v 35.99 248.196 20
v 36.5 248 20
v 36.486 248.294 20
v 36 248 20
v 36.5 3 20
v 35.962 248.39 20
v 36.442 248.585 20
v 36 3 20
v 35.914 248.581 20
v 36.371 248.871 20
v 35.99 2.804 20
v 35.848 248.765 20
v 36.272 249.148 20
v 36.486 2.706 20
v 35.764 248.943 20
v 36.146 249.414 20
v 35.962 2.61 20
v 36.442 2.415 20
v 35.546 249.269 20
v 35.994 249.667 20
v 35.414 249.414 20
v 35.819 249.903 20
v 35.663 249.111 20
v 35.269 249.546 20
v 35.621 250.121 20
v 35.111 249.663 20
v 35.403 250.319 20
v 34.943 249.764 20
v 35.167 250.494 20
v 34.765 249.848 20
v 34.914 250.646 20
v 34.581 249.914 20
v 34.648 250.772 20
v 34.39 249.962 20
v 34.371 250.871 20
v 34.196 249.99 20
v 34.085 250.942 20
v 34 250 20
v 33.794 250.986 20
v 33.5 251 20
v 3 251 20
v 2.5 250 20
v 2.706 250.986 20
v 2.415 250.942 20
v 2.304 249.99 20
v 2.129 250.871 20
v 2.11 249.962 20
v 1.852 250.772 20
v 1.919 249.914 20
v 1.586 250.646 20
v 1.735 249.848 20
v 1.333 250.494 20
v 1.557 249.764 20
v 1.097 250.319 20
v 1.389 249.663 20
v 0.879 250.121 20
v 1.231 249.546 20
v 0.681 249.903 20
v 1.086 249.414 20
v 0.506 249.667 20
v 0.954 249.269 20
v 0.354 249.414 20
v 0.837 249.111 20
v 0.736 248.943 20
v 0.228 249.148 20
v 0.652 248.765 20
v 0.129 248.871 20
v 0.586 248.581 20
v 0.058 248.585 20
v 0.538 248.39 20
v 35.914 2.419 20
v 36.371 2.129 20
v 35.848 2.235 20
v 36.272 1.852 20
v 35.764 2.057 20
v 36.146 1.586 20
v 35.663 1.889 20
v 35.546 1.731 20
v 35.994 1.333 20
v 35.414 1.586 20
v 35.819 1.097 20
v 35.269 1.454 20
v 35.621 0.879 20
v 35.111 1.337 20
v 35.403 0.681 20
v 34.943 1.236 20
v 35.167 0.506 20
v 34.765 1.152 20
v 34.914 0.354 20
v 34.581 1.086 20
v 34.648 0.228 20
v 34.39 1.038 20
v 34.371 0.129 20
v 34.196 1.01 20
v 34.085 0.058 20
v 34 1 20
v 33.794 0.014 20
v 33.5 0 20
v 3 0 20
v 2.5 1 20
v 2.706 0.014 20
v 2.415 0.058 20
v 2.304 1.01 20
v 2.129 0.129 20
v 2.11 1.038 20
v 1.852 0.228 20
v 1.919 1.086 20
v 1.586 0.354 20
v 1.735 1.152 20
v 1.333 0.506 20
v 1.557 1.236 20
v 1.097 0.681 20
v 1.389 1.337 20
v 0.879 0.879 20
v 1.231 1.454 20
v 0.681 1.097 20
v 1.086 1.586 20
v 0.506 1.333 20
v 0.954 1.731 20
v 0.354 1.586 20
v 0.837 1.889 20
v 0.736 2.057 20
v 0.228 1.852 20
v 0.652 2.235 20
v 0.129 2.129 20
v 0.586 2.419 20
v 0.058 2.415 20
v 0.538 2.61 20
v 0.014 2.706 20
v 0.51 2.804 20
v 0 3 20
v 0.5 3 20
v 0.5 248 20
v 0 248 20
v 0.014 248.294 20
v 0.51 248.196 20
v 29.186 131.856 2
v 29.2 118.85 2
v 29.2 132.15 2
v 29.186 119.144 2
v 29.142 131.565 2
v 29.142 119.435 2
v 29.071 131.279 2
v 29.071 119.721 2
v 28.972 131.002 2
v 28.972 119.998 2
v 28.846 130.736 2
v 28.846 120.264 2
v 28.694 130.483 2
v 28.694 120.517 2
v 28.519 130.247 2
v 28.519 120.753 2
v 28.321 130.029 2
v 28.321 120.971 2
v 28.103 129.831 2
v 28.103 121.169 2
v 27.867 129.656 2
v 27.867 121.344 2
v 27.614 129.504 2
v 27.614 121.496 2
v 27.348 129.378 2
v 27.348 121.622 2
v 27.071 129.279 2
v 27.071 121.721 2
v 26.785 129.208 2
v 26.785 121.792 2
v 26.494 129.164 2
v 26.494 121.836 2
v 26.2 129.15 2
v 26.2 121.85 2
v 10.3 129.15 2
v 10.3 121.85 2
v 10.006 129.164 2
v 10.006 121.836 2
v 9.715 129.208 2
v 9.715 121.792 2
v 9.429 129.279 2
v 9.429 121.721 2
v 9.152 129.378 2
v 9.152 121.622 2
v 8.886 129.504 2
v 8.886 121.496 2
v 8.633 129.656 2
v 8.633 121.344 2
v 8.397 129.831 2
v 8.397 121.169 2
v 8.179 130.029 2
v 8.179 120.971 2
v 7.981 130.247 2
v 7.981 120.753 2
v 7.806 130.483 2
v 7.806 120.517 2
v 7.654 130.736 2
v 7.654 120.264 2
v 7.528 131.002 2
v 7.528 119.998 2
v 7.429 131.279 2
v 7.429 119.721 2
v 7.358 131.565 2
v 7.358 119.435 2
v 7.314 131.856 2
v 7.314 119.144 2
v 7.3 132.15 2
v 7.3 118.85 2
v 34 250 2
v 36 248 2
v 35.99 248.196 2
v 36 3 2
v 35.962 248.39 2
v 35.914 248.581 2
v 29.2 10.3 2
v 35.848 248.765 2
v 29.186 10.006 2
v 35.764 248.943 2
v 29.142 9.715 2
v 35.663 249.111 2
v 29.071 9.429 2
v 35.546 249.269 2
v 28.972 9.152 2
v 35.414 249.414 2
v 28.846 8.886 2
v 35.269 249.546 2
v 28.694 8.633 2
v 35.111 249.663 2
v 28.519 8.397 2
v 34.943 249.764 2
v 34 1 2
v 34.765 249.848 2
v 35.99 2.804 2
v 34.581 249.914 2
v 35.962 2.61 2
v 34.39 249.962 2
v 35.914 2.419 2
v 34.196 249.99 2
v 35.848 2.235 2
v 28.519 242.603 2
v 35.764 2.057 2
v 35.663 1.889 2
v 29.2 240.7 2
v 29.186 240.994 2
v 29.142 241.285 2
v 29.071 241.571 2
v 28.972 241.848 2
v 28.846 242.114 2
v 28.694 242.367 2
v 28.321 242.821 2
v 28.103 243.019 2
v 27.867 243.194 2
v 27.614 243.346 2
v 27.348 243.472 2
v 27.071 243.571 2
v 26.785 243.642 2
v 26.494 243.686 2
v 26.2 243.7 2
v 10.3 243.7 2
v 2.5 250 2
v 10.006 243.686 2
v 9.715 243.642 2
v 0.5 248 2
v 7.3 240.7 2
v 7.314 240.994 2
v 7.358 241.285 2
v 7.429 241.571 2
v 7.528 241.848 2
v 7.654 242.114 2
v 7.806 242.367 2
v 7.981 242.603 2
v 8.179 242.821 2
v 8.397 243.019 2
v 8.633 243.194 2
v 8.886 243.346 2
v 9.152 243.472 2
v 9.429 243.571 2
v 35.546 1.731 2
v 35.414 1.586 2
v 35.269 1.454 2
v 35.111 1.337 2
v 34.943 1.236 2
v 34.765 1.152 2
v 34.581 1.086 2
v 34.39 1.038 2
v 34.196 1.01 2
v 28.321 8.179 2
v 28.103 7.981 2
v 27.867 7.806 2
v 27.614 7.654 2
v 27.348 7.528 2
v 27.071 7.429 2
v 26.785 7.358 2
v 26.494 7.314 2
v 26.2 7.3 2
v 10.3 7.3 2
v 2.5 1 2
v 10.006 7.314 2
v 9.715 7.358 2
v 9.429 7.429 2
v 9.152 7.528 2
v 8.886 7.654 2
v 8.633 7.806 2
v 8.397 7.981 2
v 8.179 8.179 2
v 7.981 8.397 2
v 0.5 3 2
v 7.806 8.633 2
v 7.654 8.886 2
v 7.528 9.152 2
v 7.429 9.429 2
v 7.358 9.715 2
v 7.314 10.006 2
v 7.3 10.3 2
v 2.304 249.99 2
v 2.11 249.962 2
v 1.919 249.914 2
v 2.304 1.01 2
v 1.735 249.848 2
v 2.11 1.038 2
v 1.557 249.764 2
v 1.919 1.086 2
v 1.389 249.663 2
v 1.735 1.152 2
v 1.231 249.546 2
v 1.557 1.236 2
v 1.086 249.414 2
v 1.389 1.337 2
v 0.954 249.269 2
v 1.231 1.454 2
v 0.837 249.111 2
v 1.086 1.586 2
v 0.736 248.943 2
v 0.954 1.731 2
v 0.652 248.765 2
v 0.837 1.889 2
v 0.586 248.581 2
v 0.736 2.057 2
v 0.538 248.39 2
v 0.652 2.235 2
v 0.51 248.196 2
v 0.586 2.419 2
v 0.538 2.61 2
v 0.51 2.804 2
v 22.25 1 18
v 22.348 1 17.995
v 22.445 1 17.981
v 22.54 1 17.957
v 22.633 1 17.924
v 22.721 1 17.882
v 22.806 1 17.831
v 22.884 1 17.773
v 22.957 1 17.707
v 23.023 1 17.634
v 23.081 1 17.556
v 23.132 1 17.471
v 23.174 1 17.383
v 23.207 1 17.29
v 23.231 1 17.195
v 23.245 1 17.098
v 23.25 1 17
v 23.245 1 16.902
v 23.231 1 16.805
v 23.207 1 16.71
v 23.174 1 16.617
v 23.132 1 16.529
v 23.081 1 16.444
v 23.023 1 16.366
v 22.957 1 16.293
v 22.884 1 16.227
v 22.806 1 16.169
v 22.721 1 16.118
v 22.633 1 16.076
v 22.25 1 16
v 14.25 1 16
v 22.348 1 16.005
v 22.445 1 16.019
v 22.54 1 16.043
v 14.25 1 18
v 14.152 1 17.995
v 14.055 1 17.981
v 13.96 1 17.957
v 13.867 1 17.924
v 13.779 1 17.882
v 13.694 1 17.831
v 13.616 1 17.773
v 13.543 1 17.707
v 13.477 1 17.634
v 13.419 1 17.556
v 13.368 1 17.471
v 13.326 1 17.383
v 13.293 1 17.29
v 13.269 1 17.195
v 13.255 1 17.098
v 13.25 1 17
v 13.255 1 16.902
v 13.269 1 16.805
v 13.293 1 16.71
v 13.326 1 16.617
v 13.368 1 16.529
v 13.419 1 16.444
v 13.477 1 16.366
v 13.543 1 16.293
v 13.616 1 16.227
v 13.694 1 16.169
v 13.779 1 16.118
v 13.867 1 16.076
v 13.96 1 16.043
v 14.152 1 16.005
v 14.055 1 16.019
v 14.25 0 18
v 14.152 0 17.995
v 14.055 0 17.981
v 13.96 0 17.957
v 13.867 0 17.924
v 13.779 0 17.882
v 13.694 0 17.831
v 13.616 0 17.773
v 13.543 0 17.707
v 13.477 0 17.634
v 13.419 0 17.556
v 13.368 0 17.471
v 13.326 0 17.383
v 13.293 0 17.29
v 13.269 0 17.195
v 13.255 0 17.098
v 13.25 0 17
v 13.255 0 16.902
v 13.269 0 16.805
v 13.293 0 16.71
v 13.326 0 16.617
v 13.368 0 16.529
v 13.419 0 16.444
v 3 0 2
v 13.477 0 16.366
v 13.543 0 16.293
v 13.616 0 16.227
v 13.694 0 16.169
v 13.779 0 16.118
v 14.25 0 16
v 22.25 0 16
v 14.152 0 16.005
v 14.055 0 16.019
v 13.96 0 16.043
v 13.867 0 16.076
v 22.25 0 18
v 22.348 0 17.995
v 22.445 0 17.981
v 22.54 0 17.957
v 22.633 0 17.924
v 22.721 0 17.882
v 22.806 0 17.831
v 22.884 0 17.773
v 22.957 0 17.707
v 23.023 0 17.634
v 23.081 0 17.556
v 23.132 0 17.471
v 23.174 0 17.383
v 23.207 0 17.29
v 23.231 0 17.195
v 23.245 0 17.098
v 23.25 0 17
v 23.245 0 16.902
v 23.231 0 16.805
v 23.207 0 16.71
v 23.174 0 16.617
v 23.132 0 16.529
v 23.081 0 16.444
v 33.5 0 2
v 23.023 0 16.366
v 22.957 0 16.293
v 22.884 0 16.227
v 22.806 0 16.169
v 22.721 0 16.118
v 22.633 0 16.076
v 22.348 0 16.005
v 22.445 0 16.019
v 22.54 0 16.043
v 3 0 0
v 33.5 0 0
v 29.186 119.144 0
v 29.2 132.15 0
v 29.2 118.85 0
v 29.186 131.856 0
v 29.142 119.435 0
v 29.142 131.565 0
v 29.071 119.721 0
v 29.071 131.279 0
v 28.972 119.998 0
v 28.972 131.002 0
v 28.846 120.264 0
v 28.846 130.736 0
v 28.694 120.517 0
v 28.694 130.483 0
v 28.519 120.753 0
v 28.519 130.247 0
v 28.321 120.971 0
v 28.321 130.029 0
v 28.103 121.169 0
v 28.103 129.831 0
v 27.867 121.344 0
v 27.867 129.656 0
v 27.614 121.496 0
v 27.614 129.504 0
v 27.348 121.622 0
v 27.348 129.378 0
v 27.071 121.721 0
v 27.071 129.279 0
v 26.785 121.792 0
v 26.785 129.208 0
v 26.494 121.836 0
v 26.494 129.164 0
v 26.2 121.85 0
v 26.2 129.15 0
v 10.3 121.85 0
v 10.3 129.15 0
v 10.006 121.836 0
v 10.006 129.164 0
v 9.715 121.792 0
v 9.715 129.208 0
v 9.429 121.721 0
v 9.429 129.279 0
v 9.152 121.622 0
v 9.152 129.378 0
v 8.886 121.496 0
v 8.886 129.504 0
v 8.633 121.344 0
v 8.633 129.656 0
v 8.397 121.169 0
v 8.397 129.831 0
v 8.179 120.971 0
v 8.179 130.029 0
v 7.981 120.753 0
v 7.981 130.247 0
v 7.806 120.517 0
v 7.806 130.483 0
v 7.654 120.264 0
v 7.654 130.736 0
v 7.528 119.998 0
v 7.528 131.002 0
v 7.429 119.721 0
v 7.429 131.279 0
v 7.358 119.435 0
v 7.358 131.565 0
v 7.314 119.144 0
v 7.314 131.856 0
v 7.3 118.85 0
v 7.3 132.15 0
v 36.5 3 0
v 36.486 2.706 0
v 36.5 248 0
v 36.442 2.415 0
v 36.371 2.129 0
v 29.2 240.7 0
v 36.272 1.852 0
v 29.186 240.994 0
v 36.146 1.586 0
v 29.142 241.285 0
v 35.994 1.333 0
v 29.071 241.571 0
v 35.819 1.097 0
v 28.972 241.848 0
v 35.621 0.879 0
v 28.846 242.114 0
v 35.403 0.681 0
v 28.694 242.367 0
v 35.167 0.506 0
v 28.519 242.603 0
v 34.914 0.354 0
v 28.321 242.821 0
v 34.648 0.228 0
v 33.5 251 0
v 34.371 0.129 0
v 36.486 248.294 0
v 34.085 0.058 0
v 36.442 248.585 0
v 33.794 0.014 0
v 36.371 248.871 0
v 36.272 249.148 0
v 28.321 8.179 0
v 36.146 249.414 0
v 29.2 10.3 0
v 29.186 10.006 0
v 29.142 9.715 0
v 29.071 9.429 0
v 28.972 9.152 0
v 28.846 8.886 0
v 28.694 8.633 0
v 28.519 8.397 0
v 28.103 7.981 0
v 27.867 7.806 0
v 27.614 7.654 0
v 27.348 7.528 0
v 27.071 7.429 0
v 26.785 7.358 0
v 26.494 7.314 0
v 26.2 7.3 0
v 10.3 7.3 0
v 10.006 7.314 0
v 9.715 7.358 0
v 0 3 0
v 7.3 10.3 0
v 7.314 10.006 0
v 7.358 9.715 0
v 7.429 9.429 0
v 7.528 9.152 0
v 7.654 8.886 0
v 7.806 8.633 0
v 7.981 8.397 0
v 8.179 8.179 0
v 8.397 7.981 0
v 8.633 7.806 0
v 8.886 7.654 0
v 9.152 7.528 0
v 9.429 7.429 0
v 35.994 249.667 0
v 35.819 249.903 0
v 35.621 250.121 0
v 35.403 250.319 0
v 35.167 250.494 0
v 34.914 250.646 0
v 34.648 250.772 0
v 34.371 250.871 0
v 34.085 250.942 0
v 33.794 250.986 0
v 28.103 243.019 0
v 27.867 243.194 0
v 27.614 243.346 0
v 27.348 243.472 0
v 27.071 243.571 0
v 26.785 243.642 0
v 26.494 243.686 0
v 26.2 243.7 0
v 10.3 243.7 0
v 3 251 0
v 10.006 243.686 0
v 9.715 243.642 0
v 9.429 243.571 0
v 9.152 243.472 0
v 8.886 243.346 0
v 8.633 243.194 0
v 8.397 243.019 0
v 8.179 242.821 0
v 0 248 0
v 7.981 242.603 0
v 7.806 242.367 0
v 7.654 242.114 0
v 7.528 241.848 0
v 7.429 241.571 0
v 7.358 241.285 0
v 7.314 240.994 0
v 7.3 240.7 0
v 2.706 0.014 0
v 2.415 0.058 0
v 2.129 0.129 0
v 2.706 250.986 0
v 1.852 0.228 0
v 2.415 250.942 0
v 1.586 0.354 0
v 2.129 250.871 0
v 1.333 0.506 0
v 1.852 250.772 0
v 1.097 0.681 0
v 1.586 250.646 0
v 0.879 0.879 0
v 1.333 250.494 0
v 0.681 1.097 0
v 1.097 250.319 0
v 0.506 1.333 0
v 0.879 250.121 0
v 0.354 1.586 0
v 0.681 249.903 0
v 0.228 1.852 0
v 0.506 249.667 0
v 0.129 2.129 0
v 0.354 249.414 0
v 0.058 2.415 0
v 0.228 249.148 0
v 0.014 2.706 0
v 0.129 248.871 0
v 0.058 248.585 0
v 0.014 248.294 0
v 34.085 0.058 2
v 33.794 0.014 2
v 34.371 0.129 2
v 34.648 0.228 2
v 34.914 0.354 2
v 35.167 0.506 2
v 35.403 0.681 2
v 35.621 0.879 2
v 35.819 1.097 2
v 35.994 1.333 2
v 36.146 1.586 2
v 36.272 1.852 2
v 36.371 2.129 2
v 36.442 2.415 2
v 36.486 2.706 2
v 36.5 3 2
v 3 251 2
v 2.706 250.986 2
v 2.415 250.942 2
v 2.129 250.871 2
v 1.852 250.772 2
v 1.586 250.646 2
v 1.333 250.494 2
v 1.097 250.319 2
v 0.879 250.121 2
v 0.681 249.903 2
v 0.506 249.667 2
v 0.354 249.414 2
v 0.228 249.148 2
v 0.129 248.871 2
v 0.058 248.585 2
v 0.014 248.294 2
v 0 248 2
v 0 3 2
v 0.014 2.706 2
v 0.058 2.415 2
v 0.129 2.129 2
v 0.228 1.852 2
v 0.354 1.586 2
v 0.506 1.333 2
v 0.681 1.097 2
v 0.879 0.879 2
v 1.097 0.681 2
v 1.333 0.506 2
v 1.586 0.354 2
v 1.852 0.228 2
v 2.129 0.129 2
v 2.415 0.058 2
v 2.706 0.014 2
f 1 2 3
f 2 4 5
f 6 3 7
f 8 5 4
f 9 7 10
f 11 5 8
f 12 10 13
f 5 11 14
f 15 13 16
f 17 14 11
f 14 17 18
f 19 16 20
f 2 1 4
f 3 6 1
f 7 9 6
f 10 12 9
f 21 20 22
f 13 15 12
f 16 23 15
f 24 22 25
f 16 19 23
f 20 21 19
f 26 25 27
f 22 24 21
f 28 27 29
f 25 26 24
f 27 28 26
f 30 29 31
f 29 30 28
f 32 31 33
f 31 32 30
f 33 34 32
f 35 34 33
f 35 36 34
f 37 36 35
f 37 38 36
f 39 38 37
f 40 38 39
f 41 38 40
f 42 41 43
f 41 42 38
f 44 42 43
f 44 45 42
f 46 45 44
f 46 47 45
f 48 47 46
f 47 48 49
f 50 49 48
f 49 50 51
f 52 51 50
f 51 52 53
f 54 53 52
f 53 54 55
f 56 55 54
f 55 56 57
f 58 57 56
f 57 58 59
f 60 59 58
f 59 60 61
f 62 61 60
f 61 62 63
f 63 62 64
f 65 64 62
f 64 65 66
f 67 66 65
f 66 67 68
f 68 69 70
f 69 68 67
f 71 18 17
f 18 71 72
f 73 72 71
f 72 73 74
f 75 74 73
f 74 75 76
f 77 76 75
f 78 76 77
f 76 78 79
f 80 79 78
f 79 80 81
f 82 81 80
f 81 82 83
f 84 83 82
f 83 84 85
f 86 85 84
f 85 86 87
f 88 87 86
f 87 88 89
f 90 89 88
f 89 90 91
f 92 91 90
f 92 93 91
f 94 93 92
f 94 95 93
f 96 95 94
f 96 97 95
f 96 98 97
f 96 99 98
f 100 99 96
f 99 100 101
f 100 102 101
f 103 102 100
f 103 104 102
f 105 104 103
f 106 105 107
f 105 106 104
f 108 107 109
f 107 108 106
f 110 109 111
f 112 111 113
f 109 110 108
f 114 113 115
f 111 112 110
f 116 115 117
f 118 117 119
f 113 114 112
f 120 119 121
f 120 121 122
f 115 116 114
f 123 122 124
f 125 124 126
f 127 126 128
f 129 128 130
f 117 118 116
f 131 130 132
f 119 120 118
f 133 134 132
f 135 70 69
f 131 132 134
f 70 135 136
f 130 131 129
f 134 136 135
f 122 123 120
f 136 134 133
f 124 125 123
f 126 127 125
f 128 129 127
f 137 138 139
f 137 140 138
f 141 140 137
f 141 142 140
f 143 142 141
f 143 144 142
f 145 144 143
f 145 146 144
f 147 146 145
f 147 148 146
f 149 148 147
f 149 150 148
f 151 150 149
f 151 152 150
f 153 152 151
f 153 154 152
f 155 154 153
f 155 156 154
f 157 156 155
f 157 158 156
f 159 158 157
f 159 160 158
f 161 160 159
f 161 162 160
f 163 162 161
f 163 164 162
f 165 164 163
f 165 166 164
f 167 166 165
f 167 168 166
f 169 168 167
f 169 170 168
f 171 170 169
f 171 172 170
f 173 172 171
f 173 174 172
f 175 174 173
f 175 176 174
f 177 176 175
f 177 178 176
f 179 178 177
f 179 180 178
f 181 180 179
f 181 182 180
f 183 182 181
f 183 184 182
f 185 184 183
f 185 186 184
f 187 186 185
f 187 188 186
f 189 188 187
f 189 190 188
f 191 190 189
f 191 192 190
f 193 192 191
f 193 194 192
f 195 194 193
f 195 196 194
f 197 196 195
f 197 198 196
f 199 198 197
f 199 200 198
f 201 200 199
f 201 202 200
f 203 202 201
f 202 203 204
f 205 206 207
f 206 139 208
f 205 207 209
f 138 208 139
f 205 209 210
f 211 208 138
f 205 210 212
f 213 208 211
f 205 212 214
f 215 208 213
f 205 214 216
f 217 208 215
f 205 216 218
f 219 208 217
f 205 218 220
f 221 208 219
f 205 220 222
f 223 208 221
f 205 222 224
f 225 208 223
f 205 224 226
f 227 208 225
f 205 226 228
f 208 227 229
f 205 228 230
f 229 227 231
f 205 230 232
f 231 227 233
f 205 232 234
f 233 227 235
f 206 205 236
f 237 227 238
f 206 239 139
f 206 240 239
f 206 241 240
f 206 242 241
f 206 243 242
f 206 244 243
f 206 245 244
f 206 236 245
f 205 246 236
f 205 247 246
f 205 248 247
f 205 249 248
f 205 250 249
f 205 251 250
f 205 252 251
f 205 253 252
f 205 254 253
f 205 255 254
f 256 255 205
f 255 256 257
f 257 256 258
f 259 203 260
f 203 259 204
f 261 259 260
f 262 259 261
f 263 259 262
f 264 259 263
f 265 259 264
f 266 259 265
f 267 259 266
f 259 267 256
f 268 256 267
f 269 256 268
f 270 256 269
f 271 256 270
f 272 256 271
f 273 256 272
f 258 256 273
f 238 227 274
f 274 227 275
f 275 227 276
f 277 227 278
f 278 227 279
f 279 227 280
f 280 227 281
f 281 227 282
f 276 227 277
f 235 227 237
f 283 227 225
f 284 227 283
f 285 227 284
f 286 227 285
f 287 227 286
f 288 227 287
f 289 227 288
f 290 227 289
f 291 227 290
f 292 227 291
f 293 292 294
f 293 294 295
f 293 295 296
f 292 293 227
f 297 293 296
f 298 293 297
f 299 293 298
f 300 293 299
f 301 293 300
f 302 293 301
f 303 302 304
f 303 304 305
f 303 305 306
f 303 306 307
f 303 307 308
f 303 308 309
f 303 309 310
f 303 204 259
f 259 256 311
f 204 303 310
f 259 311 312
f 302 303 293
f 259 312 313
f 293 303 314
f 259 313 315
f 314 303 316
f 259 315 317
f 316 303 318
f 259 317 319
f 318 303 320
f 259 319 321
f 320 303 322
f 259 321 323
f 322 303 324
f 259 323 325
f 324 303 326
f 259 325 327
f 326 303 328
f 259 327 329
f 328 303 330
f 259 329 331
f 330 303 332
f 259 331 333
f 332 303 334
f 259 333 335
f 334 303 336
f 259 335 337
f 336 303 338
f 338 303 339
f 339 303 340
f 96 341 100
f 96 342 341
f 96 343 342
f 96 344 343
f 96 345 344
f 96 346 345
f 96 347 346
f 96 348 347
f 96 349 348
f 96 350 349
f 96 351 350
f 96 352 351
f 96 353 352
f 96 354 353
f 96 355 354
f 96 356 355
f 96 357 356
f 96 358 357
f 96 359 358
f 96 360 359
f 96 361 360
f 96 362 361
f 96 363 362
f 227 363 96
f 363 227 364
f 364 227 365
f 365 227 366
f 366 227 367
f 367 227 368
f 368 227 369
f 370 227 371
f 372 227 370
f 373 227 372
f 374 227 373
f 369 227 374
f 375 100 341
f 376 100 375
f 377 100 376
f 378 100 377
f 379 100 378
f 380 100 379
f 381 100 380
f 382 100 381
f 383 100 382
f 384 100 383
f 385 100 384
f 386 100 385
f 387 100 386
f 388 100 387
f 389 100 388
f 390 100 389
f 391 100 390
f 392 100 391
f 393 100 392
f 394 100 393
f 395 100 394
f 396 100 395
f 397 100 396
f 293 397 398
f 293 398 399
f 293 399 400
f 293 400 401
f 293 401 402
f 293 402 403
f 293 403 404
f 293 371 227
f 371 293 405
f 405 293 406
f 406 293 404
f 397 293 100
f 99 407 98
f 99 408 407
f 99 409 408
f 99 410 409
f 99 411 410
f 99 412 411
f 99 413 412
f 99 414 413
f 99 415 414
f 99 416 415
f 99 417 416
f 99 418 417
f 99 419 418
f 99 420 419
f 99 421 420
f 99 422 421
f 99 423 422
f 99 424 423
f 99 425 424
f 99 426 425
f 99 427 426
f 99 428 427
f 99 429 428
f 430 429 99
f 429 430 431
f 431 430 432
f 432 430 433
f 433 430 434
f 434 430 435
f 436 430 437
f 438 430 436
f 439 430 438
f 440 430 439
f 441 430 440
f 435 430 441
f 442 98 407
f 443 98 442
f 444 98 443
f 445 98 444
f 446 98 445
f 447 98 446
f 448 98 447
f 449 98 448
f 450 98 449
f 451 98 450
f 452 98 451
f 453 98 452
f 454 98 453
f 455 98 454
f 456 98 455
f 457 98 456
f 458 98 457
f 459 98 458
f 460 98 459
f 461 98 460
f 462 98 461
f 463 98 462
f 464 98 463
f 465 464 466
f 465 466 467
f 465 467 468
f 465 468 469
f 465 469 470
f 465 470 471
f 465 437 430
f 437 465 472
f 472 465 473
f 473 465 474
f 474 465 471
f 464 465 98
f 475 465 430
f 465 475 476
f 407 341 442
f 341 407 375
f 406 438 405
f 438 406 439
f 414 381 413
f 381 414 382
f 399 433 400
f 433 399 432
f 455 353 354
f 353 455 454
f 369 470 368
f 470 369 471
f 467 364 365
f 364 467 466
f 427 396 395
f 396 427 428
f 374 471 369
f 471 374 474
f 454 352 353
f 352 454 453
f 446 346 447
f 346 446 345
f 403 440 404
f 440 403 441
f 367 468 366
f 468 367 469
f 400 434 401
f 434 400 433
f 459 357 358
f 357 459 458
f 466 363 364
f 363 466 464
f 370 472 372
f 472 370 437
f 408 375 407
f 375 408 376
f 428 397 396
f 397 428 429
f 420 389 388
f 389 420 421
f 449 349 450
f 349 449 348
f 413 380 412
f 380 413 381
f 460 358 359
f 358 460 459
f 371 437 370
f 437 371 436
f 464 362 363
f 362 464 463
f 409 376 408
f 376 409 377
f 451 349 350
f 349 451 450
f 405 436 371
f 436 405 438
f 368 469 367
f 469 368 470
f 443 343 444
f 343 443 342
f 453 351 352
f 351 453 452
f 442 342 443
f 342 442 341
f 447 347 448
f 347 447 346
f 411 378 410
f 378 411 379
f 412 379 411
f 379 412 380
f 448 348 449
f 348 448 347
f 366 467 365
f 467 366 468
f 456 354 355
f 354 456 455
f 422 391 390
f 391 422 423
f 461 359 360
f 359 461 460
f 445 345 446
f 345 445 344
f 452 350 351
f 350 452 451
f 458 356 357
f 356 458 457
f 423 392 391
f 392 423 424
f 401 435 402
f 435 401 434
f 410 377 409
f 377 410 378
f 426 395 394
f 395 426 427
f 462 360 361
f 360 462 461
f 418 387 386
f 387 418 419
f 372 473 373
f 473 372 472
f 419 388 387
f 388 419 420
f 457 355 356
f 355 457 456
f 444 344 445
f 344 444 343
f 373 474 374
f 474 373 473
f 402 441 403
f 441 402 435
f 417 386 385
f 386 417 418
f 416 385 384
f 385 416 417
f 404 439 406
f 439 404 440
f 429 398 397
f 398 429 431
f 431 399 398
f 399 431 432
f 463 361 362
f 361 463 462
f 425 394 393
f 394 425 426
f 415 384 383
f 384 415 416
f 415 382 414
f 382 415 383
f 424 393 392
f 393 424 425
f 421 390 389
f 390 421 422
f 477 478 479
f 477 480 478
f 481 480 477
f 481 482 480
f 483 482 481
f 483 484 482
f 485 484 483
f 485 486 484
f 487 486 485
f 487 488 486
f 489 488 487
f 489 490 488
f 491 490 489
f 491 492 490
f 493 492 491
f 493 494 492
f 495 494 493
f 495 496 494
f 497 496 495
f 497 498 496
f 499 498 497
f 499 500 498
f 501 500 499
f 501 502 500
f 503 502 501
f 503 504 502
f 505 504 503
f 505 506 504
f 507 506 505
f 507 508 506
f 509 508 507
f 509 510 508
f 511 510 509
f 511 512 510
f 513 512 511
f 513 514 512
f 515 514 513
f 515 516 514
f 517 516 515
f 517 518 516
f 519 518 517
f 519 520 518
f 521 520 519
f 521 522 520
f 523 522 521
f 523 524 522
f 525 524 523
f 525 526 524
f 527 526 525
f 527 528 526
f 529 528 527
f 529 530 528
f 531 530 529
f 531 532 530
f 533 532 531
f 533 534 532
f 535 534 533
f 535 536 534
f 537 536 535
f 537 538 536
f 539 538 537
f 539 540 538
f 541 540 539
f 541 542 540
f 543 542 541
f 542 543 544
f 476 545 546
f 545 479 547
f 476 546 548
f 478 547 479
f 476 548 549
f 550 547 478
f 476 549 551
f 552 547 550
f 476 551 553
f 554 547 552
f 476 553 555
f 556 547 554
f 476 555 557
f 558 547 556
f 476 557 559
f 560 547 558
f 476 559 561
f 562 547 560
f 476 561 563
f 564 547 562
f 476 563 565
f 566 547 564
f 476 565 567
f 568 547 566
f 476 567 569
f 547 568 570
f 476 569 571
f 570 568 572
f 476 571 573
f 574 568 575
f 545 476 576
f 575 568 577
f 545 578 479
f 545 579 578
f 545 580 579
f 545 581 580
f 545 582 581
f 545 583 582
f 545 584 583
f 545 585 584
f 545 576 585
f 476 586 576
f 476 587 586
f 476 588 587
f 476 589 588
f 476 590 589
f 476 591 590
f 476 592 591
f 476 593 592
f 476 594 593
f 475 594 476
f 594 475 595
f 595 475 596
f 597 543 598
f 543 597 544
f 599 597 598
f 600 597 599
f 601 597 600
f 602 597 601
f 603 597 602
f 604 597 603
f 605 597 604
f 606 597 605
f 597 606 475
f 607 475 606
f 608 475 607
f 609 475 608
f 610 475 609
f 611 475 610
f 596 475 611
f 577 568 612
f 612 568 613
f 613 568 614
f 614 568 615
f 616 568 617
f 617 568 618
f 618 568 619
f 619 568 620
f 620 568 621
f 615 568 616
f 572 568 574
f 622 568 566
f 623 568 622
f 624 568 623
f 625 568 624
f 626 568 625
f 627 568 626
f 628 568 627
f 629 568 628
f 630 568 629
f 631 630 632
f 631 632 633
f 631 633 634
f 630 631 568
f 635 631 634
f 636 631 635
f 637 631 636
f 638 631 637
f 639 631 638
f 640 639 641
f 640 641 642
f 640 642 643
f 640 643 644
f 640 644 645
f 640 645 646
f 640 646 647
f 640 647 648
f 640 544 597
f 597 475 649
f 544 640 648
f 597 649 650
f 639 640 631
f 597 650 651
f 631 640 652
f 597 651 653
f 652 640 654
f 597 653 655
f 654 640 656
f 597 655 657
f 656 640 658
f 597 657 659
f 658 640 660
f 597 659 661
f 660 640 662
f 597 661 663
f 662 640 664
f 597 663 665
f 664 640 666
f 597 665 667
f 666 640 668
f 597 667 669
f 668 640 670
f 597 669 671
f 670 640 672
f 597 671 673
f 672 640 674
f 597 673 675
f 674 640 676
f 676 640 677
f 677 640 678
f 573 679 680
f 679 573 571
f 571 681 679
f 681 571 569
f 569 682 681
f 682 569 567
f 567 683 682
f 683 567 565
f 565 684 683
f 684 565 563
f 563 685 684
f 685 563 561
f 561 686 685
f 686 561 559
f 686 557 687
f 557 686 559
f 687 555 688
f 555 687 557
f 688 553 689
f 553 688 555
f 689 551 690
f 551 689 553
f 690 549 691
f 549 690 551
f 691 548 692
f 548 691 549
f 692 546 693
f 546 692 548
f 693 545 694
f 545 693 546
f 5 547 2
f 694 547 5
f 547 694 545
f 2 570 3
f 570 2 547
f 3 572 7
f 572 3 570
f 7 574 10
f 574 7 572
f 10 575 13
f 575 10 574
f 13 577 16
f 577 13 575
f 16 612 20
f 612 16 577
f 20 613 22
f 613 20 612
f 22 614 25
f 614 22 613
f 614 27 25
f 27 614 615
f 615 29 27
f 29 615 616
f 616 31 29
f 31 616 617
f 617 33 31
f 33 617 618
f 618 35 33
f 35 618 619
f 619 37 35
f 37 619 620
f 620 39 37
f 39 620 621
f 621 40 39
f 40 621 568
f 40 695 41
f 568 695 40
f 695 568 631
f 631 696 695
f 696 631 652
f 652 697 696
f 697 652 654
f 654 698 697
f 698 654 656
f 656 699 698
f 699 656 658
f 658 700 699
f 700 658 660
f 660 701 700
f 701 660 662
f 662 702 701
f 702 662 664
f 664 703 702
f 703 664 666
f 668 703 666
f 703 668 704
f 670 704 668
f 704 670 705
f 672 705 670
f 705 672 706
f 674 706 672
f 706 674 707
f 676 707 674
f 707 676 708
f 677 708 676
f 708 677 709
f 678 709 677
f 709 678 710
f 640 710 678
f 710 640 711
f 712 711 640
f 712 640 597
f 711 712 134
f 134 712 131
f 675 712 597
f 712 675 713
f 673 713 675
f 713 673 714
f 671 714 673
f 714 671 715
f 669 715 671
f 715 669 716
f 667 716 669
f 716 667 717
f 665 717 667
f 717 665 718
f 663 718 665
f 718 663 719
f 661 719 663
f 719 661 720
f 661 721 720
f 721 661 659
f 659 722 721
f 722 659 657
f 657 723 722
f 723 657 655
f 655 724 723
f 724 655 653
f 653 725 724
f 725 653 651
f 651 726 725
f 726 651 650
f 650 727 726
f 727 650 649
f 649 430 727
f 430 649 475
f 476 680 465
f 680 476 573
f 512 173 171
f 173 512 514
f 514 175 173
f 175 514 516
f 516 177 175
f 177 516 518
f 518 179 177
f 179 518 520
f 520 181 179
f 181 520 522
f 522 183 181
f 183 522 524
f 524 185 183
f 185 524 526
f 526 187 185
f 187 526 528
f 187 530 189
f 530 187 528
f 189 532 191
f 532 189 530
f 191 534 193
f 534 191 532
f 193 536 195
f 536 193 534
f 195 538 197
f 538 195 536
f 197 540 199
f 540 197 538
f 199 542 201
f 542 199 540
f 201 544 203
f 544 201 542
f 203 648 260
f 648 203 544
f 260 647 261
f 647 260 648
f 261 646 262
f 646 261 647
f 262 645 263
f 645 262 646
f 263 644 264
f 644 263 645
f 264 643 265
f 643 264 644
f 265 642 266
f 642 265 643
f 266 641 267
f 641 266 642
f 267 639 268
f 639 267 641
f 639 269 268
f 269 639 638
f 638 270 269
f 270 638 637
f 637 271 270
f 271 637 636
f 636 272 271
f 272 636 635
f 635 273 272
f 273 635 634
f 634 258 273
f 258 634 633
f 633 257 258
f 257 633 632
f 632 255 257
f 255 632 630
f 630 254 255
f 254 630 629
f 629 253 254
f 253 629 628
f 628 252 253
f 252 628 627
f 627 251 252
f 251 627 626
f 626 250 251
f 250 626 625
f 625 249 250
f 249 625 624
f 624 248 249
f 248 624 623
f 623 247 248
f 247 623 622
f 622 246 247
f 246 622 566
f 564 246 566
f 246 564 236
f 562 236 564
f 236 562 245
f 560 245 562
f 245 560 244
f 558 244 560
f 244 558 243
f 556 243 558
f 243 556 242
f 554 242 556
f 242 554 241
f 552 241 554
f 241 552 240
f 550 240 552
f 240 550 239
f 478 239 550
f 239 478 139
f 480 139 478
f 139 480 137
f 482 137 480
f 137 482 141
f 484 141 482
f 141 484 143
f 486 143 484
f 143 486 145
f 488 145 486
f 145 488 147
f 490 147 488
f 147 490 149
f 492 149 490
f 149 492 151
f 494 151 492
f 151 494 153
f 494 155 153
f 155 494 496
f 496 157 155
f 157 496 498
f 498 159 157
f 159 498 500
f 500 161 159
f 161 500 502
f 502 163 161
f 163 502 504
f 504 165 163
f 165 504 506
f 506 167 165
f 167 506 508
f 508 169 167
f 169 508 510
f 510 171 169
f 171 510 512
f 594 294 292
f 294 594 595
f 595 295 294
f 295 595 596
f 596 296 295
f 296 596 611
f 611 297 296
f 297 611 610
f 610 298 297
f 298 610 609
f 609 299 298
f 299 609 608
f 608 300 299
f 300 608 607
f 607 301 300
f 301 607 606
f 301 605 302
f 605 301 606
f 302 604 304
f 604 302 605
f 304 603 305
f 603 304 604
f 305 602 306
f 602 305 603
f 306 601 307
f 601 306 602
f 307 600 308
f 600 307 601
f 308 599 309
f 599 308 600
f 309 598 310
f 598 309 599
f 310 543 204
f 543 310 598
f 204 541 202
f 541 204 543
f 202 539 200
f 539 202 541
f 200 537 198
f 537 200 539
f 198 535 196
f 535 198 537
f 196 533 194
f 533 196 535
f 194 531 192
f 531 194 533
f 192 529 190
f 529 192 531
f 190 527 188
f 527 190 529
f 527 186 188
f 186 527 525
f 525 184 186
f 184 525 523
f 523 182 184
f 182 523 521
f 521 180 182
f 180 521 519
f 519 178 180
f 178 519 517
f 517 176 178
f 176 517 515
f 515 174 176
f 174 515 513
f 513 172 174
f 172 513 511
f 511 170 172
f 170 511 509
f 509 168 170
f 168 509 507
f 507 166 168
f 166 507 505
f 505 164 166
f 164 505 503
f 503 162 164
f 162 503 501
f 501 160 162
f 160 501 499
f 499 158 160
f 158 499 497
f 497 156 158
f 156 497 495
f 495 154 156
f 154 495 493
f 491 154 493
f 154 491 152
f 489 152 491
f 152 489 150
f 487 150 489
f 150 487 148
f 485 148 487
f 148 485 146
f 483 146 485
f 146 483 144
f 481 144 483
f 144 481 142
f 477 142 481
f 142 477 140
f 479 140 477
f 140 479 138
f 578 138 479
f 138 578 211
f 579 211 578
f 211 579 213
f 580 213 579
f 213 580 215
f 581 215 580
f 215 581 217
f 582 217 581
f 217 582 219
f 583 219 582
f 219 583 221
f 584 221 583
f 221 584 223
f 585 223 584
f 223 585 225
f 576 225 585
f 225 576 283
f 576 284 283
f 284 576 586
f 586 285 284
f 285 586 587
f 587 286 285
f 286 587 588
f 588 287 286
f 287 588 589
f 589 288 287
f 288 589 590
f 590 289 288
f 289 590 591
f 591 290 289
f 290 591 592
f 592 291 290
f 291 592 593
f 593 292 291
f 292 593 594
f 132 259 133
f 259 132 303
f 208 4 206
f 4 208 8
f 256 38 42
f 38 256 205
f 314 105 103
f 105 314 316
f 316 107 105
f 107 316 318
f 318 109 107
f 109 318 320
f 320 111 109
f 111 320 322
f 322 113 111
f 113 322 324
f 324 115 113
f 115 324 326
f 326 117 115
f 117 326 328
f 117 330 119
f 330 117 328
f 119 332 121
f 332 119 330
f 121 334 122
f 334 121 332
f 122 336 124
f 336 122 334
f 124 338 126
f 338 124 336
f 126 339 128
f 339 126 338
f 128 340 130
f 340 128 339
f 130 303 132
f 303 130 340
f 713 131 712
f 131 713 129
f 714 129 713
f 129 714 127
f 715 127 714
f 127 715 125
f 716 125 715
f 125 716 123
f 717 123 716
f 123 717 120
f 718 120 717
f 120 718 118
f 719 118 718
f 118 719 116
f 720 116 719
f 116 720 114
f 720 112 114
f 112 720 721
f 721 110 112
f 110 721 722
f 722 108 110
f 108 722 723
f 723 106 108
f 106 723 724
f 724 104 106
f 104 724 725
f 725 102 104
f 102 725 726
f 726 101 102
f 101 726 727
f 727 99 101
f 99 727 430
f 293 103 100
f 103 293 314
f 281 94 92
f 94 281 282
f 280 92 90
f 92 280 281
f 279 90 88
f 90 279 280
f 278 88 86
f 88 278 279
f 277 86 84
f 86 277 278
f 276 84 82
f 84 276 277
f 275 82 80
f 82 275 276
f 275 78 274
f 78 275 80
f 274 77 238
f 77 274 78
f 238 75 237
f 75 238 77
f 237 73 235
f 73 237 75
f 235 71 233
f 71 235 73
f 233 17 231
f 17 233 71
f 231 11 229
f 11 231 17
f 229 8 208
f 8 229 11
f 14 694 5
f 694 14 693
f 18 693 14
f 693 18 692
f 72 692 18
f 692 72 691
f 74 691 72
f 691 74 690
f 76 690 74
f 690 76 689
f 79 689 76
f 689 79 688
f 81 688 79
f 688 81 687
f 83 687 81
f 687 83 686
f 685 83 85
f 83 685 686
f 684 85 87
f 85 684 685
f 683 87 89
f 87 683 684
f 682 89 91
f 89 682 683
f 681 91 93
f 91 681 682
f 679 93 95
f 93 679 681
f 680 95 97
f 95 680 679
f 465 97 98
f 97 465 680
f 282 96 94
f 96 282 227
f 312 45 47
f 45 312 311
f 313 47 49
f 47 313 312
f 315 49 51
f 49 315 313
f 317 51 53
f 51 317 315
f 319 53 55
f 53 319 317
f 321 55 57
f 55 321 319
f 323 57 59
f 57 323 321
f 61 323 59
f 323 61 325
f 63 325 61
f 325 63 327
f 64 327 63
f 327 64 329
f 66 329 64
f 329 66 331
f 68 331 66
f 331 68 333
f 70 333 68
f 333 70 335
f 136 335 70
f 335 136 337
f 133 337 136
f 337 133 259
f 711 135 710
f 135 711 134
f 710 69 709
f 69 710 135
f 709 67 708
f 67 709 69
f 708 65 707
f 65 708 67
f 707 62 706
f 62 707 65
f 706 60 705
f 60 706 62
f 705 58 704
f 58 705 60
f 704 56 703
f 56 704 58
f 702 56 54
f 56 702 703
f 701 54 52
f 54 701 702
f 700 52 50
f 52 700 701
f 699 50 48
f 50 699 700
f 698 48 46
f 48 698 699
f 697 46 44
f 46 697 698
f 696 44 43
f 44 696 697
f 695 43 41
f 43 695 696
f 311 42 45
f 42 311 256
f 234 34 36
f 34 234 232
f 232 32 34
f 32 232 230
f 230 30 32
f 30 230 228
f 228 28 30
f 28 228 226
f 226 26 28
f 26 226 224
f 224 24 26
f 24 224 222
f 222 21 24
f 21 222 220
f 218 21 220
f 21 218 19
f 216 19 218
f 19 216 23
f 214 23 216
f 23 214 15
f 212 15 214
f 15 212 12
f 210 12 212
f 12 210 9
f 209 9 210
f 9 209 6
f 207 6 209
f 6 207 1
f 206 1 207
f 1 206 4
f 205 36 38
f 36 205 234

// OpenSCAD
$fn = $preview ? 16 : 64;

bottom_thickness = 2;
side_thickness = 0.5;
face_thickness = 2 * side_thickness;
width = 36.5;
length = 251;
height = 20;
handle_width = 10;
handle_height = 2;
corner_radius = 3;

module rounded_square(size, radius, center = true) {
  if (center) {
    square([size.x - 2 * radius, size.y], center = true);
    square([size.x, size.y - 2 * radius], center = true);
    translate([- size.x / 2 + radius, - size.y / 2 + radius]) circle(r = radius);
    translate([size.x / 2 - radius, - size.y / 2 + radius]) circle(r = radius);
    translate([- size.x / 2 + radius, size.y / 2 - radius]) circle(r = radius);
    translate([size.x / 2 - radius, size.y / 2 - radius]) circle(r = radius);
  } else {
    translate([radius, 0]) square([size.x - 2 * radius, size.y], center = false);
    translate([0, radius]) square([size.x, size.y - 2 * radius], center = false);
    translate([radius, radius]) circle(r = radius);
    translate([size.x - radius, radius]) circle(r = radius);
    translate([radius, size.y - radius]) circle(r = radius);
    translate([size.x - radius, size.y - radius]) circle(r = radius);
  }
}

module bottom () {
  linear_extrude(height = bottom_thickness) {
    flange_width = width / 5;
    difference() {
      rounded_square([width, length], corner_radius, center = false);
      translate([flange_width, flange_width]) rounded_square([3 * flange_width, (length - 3 * flange_width) / 2], corner_radius, center = false);
      translate([flange_width, (length + flange_width) / 2]) rounded_square([3 * flange_width, (length - 3 * flange_width) / 2], corner_radius, center = false);
    }
  }
}

module side() {
  cube([side_thickness, length - 2 * corner_radius, height - bottom_thickness], center = false);
}

module face() {
  cube([width - 2 * corner_radius, face_thickness, height - bottom_thickness], center = false);
}

module corner() {
  hole_radius = corner_radius - face_thickness;
  d = corner_radius - hole_radius - side_thickness;
  linear_extrude(height = height) {
    intersection() {
      difference() {
        circle(r = corner_radius);
        translate([d, 0]) circle(r = hole_radius);
        square([d, hole_radius], center = false);
      }
      square([corner_radius, corner_radius], center = false);
    }
  }
}

module handle_hole() {
  translate([0, face_thickness, 0]) rotate([90, 0, 0]) linear_extrude(height = face_thickness) rounded_square([handle_width, handle_height], handle_height / 2, center = false);
}

bottom();
translate([0, corner_radius, bottom_thickness]) side();
translate([width - side_thickness, corner_radius, bottom_thickness]) side();
difference() {
  translate([corner_radius, 0, bottom_thickness]) face();
  translate([width / 2 - handle_width / 2, 0, height - handle_height - 2]) handle_hole();
}
translate([corner_radius, length - face_thickness, bottom_thickness]) face();
translate([corner_radius, corner_radius, 0]) rotate(a = [0, 0, 180]) corner();
translate([width - corner_radius, corner_radius, 0]) rotate(a = [0, 0, 180]) mirror([1, 0, 0]) corner();
translate([corner_radius, length - corner_radius, 0]) rotate(a = [0, 0, 0]) mirror([1, 0, 0]) corner();
translate([width - corner_radius, length - corner_radius, 0]) corner();
